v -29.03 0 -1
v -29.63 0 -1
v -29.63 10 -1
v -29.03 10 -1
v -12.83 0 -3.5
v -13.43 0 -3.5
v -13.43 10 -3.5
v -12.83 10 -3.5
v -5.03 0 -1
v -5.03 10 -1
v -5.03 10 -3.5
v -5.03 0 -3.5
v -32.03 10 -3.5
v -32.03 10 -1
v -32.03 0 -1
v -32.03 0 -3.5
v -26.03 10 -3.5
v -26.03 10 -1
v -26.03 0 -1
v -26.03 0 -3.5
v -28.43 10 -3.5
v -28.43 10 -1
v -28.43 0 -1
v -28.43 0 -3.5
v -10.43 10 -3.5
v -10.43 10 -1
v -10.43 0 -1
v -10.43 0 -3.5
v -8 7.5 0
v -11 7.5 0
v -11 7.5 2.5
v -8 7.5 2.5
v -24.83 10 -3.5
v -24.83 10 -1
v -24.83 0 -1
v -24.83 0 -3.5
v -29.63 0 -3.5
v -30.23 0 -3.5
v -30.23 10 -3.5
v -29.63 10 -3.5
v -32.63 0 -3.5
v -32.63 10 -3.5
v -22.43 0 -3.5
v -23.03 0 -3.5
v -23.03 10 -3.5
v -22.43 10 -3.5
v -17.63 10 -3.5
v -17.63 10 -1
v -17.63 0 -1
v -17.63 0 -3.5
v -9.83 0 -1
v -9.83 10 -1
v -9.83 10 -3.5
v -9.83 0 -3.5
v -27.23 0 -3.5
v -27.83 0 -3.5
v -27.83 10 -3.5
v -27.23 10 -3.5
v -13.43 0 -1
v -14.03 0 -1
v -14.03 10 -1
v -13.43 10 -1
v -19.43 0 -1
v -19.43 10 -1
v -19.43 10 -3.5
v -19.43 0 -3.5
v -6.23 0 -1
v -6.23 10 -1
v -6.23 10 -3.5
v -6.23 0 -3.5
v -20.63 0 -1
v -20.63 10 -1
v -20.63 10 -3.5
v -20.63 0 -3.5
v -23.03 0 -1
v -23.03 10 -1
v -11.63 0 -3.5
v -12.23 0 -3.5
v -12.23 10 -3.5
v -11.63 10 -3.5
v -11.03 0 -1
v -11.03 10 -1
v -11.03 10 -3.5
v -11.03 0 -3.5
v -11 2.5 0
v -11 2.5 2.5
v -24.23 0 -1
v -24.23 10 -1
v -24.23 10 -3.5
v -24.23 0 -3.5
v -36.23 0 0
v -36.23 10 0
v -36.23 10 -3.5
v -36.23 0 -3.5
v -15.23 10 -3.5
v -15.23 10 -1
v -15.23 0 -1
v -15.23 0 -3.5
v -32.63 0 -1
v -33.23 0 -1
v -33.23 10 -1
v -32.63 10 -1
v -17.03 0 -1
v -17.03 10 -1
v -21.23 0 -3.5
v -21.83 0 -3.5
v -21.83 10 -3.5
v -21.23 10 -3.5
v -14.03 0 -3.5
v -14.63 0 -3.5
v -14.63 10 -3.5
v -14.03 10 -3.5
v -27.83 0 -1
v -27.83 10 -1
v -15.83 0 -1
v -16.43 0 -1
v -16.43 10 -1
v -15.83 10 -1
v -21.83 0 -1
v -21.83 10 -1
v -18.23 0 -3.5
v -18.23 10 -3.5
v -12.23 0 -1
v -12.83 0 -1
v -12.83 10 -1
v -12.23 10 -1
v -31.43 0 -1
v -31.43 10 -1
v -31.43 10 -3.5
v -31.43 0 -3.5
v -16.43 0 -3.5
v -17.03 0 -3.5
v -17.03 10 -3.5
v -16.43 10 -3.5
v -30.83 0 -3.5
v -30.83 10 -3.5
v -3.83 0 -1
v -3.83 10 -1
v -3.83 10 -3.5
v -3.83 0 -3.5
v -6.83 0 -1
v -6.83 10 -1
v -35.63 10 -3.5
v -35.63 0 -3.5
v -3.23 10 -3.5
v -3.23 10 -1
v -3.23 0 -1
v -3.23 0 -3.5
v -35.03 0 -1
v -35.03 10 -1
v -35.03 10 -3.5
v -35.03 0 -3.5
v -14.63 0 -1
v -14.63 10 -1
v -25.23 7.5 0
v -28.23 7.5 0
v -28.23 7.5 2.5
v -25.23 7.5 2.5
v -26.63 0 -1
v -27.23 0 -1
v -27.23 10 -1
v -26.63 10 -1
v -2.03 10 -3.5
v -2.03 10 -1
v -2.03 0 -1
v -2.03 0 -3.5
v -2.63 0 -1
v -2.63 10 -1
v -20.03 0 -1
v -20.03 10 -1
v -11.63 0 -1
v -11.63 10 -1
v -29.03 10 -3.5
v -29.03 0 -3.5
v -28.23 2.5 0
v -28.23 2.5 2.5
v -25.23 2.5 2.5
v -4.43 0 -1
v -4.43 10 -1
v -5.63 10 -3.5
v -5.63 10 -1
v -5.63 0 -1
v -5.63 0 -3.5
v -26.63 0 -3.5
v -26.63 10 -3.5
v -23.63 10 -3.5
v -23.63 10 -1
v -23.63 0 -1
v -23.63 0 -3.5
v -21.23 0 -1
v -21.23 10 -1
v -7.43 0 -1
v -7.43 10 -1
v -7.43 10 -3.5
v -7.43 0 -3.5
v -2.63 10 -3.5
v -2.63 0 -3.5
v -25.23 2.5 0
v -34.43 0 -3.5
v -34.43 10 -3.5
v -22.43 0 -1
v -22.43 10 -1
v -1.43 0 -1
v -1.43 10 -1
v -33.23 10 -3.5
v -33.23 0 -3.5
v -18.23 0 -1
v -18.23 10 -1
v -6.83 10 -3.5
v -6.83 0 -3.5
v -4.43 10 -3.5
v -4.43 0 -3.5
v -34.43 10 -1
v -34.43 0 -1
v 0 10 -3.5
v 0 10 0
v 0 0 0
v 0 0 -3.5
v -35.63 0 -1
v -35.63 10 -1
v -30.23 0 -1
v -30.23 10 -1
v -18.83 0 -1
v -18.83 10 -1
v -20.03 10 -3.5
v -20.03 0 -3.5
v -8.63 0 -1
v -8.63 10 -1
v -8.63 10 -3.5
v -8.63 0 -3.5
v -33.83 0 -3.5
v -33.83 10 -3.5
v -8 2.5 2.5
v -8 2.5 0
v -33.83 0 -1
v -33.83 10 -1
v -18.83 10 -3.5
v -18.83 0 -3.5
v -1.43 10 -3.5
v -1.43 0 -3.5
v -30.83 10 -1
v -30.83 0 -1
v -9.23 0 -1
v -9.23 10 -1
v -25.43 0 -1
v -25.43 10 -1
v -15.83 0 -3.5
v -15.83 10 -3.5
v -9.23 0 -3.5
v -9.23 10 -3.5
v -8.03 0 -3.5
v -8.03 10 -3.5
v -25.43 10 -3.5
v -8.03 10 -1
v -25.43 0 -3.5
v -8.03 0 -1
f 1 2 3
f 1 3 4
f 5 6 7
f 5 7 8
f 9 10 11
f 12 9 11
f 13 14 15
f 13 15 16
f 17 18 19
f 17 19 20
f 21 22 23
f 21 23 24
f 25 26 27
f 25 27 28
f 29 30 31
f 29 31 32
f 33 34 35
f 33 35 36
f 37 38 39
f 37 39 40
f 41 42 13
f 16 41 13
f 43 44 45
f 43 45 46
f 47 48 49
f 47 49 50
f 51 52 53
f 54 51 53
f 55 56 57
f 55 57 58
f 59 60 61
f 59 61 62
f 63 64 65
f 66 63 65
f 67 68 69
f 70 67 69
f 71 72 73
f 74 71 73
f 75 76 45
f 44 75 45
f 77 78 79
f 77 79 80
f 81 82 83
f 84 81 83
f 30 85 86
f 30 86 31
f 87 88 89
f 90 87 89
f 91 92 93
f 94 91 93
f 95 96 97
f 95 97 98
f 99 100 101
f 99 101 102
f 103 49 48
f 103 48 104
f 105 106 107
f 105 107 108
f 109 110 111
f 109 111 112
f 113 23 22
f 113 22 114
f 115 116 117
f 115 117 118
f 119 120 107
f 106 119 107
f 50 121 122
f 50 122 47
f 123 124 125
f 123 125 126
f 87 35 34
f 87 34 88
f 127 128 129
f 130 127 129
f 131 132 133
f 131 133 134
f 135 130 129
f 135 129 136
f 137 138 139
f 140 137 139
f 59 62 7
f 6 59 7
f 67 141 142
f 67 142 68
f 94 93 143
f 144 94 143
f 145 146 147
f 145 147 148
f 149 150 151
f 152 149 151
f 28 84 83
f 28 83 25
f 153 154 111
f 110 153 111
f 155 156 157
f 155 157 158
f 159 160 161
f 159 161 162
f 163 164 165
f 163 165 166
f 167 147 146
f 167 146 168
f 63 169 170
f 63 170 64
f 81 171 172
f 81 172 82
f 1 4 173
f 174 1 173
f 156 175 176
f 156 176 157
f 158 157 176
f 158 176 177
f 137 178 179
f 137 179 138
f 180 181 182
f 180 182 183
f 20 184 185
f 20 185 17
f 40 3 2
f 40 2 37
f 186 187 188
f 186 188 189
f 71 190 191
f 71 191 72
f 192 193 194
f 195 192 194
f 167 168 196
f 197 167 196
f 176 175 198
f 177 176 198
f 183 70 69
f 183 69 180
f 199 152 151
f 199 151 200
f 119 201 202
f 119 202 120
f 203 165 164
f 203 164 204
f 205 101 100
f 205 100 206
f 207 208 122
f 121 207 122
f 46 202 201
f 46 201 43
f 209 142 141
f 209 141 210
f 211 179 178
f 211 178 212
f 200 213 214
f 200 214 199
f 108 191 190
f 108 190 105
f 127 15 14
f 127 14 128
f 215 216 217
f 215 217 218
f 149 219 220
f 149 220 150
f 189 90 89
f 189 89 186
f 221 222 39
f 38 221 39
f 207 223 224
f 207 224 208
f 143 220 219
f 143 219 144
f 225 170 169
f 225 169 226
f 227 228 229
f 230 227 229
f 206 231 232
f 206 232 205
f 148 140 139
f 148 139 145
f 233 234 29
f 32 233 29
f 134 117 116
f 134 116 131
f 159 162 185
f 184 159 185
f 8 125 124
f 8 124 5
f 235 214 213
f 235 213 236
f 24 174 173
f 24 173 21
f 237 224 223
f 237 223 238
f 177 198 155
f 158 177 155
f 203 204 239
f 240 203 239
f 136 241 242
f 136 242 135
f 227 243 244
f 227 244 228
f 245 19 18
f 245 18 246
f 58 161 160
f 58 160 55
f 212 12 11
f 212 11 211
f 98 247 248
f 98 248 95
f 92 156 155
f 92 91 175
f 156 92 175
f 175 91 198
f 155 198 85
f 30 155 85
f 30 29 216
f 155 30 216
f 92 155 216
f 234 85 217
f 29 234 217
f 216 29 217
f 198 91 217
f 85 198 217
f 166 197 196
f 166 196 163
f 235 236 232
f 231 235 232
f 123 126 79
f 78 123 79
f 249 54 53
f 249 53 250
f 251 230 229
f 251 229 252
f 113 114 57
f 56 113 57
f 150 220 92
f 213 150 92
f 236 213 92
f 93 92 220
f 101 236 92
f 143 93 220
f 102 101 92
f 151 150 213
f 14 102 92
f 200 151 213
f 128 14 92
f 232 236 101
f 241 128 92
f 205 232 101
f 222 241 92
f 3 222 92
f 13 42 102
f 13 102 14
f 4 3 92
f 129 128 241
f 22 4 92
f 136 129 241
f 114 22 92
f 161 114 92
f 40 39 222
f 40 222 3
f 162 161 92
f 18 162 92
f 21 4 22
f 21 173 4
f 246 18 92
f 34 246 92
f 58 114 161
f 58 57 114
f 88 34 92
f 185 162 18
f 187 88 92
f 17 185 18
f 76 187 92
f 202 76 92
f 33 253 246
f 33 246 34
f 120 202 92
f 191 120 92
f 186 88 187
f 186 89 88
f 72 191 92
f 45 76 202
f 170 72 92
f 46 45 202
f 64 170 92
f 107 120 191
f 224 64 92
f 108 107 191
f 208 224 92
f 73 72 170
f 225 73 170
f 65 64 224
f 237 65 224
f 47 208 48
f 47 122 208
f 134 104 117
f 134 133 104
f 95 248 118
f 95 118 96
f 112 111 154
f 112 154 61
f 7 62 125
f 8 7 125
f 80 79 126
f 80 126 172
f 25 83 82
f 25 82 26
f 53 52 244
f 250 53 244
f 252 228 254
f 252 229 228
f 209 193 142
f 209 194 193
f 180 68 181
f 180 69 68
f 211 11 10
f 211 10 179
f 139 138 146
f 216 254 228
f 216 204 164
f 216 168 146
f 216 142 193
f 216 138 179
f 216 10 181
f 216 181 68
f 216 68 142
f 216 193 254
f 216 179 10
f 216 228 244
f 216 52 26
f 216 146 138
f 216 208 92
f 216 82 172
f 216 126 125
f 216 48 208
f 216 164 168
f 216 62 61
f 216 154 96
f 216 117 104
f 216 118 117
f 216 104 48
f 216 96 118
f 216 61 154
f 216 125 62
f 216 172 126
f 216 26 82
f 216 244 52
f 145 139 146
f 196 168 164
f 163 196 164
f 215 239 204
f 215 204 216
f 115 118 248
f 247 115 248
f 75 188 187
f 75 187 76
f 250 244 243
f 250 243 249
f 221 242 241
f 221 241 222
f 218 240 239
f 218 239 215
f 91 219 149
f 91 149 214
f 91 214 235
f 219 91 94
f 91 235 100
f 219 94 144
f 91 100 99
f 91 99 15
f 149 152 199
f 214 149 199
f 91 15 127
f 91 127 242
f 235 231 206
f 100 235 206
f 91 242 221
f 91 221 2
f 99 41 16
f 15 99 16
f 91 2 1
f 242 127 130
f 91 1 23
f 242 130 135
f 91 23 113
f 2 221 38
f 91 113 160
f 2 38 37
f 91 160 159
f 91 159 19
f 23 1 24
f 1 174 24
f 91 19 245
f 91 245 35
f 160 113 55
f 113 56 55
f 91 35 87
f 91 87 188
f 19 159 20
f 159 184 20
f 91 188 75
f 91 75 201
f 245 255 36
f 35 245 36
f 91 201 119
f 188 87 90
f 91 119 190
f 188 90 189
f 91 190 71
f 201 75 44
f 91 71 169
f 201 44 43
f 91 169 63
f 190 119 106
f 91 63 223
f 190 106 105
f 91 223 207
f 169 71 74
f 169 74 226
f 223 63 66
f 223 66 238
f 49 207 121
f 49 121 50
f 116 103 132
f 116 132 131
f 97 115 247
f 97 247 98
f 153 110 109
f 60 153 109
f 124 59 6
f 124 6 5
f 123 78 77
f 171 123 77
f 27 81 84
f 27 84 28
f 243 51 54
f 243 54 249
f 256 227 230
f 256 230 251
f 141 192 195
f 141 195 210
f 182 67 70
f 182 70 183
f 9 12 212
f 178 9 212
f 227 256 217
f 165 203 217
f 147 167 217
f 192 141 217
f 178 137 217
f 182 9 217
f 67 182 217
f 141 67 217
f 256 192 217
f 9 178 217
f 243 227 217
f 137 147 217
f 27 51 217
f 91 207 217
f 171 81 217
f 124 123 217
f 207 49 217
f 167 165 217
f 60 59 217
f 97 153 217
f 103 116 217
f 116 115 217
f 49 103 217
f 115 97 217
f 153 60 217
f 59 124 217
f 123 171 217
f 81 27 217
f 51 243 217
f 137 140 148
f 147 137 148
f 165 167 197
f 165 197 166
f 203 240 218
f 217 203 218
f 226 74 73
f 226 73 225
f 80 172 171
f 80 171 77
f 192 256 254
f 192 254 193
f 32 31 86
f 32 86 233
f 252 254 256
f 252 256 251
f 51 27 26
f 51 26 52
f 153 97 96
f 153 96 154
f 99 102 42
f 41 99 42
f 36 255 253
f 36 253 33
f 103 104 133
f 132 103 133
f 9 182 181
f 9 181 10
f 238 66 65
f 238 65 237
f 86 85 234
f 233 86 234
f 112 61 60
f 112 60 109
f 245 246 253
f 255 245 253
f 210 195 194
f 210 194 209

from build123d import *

# Parameters (mm, degrees)
SKETCH1_W           = 36.23
SKETCH1_H           = 3.5
BOSS_EXTRUDE1_DEPTH = 10
SKETCH3_W           = 3
SKETCH3_H           = 5
BOSS_EXTRUDE2_DEPTH = 2.5
SKETCH4_W           = 0.6
SKETCH4_H           = 2.5
CUT_EXTRUDE1_DEPTH  = 11
LPATTERN1_COUNT     = 29
LPATTERN1_PITCH     = 1.2


with BuildPart() as part:
    # Sketch1 → Boss-Extrude1 (new body)
    with BuildSketch(Plane(origin=(0, 0, 0), x_dir=(1, 0, 0), z_dir=(0, 1, 0))):
        with Locations((-18.115, 1.75)):
            Rectangle(SKETCH1_W, SKETCH1_H)
    extrude(amount=BOSS_EXTRUDE1_DEPTH)

    # Sketch3 → Boss-Extrude2 (add)
    with BuildSketch(Plane.XY):
        with Locations((-26.73, 5)):
            Rectangle(SKETCH3_W, SKETCH3_H)
        with Locations((-9.5, 5)):
            Rectangle(SKETCH3_W, SKETCH3_H)
    extrude(amount=BOSS_EXTRUDE2_DEPTH)

    # Sketch4 → Cut-Extrude1 (cut, through all)
    with BuildSketch(Plane(origin=(0, 10, 0), x_dir=(1, 0, 0), z_dir=(0, 1, 0))):
        with Locations((-35.33, 2.25)):
            Rectangle(SKETCH4_W, SKETCH4_H)
    cut_extrude1 = extrude(amount=-CUT_EXTRUDE1_DEPTH, mode=Mode.SUBTRACT)

    # LPattern1: Cut-Extrude1 ×29
    with Locations(*[(i * LPATTERN1_PITCH, 0, 0) for i in range(1, LPATTERN1_COUNT)]):
        add(cut_extrude1, mode=Mode.SUBTRACT)


solid = part.part
